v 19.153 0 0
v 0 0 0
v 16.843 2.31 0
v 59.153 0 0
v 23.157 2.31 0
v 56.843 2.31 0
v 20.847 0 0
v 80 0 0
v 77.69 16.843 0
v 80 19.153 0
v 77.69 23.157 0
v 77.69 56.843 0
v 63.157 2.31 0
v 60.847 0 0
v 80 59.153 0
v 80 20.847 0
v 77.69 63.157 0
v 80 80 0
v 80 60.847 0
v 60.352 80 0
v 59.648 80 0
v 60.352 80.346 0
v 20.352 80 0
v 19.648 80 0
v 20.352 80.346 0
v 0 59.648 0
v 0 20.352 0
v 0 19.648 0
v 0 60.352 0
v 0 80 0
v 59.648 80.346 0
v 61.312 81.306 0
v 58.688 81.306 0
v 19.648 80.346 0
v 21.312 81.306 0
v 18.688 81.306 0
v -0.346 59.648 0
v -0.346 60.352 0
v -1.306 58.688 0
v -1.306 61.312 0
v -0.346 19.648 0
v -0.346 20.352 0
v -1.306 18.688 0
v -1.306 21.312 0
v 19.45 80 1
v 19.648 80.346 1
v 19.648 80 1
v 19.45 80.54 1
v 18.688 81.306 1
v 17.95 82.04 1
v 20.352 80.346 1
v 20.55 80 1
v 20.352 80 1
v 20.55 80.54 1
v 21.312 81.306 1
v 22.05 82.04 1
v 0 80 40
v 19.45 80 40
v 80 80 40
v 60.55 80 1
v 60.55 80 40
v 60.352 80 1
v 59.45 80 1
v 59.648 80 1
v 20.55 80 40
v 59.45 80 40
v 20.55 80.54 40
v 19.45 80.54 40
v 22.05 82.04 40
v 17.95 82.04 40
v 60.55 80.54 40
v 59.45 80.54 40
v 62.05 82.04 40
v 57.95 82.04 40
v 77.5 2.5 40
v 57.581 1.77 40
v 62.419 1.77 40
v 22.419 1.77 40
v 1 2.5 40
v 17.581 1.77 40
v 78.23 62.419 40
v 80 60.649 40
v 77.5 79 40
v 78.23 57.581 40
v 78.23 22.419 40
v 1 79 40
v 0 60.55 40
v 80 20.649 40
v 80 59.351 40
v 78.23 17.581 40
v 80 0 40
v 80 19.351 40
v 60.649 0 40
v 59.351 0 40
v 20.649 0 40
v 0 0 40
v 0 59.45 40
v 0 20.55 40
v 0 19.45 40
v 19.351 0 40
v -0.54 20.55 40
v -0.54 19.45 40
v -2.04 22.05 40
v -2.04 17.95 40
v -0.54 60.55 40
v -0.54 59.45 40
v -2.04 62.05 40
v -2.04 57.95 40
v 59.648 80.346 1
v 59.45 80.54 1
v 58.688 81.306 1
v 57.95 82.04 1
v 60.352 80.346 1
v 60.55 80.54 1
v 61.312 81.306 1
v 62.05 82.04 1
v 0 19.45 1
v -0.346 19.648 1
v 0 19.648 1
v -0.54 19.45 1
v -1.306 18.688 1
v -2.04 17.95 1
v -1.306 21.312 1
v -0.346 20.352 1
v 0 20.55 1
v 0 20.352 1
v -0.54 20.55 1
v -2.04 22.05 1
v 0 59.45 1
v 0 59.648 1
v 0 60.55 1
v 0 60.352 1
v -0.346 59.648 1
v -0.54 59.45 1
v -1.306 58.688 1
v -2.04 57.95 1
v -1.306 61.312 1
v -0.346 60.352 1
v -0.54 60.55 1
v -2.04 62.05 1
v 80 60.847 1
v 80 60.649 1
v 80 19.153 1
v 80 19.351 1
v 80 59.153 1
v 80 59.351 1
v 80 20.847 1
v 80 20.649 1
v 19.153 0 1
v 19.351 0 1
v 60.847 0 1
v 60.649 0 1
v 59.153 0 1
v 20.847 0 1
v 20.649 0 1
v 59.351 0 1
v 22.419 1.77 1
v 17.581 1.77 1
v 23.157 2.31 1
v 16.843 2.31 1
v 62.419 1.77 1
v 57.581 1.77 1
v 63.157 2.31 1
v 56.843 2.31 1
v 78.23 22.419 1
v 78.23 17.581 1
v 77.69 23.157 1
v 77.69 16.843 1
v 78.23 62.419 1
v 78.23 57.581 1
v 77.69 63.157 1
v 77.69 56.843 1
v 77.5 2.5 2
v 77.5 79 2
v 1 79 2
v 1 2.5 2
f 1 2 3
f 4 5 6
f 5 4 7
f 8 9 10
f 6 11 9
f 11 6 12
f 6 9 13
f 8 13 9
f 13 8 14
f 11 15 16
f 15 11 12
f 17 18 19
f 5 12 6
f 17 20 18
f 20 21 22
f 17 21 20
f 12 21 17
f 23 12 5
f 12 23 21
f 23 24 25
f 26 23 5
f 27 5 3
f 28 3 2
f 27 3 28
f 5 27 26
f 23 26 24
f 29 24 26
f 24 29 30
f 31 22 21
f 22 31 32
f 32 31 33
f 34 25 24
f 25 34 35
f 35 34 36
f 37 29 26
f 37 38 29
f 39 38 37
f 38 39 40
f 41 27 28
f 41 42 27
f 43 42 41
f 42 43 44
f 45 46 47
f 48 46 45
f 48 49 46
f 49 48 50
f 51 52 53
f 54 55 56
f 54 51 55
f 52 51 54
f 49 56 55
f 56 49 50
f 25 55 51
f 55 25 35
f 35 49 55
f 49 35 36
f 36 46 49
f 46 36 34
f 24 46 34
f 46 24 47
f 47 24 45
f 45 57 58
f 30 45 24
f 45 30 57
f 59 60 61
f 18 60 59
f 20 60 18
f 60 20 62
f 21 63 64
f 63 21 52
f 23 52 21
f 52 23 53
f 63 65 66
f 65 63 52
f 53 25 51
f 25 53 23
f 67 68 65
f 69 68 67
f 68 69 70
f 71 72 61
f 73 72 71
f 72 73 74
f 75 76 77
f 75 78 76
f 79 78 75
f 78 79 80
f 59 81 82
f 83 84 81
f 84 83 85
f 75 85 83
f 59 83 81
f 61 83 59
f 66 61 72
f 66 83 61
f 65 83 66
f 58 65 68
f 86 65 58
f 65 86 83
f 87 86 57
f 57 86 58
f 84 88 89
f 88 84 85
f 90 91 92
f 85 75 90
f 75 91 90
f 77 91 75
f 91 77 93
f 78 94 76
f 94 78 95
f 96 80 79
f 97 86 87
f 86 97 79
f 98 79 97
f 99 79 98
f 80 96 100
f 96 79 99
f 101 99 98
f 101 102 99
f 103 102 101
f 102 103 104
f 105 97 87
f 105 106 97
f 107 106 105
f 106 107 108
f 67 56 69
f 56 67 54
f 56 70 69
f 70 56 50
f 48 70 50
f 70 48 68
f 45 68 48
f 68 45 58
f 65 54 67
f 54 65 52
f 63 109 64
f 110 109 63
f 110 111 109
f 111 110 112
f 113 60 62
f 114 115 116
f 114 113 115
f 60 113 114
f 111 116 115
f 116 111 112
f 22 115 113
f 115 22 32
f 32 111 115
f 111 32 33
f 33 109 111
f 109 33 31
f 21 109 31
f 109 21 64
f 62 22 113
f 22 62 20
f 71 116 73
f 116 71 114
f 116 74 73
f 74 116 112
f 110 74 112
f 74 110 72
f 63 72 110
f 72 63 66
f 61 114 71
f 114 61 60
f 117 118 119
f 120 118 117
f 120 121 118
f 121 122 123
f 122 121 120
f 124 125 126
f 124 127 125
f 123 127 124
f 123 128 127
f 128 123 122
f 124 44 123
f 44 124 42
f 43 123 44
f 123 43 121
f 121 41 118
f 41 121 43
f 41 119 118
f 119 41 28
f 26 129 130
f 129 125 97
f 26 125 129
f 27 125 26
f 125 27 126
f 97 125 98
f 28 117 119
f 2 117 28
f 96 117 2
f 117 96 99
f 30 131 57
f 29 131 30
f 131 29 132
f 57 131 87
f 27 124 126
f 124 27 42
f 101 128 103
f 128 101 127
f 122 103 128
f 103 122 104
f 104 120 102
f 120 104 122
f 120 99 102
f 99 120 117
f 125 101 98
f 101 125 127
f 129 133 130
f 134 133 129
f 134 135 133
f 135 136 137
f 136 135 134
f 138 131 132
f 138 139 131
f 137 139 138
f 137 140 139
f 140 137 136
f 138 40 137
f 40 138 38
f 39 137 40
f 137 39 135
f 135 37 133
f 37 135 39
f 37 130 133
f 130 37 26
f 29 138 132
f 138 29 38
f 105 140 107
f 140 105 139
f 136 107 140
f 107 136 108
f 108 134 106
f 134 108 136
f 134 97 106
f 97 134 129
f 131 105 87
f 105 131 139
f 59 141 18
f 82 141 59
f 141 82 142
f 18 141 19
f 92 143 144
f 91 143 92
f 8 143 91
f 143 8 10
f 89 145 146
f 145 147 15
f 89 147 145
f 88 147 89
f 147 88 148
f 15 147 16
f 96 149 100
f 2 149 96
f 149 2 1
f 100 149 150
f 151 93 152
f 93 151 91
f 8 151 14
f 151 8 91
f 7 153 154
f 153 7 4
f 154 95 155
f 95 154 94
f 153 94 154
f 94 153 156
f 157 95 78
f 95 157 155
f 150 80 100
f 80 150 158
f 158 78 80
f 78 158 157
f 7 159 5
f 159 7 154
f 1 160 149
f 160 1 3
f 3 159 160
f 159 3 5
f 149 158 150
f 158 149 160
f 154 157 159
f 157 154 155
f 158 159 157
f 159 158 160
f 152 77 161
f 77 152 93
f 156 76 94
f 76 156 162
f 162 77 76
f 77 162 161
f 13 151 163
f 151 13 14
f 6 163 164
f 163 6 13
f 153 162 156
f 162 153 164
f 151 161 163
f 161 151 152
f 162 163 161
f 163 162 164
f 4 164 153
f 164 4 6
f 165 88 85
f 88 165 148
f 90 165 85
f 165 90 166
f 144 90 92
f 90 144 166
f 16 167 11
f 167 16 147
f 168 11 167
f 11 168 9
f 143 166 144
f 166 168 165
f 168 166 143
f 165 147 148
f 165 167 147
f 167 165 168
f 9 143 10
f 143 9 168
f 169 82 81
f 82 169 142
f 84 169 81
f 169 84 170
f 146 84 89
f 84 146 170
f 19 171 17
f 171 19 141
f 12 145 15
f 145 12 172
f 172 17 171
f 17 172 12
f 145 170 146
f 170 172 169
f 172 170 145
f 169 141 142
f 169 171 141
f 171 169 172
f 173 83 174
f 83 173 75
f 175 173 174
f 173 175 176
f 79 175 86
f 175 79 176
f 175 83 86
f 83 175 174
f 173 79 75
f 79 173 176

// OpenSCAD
//this section defines a module for creating a "rounded" bottom to the box, useful when storing small parts
module RoundBottom(width, length, height){    
    translate([0,length,0])rotate([90,0,0])
    linear_extrude(length, center=false)
    
    difference() {
        translate([-width/2,0,0])square([width,height/2],center=false);
        translate([0,height/2,0])resize([width,height]) circle(d=width*10);
    }
}


module interlockingbox(
    //Box Width in units
    BoxWidthUnits = 3,
    //Box Length in units
    BoxLengthUnits = 3,
    //Box Height in mm
    BoxHeight = 120
)
{
echo(version=version(2.0));
//comments: Version 2 adds anti-"elephant foot" scaling at bottom of dovetail sections
/* [Size] */
//Box unit size in mm. This defines the size of 1 'unit' for your box.
BoxUnits = 40;
BoxWidth = BoxWidthUnits * BoxUnits;
BoxLength = BoxLengthUnits * BoxUnits;
//Box Wall Thickness in mm
BoxWall = 1;
//Box Floor Thickness in mm
BoxFloor = 2;
//Fit Factor. Greater factor = looser fit
FitFactor = 0.18;  // [0:0.05:0.4]
//RoundedBottom = "EW"; // [EW:East-West, NS:North-South]
RoundedBottom = ""; // [EW:East-West, NS:North-South]

/* [Walls] */
//North Wall open or closed
NorthWallOpen = 0; // [0:Closed, 1:Open]
//South Wall open or closed
SouthWallOpen = 0; // [0:Closed, 1:Open]

/* [Dovetail] */
//Dovetail inside length in mm
DTInsideLength = 1.1;
//Dovetail angle in degrees
DTAngle = 45;
//Dovetail width in mm
DTWidth = 1.5;

/* [Hidden] */
//This helps calculate the length of the 'long' side of the dovetail
DTx=tan(DTAngle)*DTWidth;
//This polygon defines the dovetail shape
DTShape = [[0,0],[DTInsideLength/2,0],[DTInsideLength/2+DTx,DTWidth],[-DTInsideLength/2-DTx,DTWidth],[-DTInsideLength/2,0]];



union(){
    //creates and transforms rounded bottom
    if (RoundedBottom=="EW") {
    translate([0,(BoxWidth/2)+BoxWall,BoxFloor])
    rotate([0,0,-90])
    RoundBottom(BoxWidth-DTWidth-(BoxWall),BoxLength-DTWidth-BoxWall,2*(BoxHeight-BoxFloor));
    }

    //creates rounded bottom oriented North-South
    if (RoundedBottom=="NS") {
    translate([(BoxLength/2)-BoxWall,DTWidth+BoxWall/2,BoxFloor])
    rotate([0,0,0])
    RoundBottom(BoxLength-DTWidth-(BoxWall),BoxWidth-DTWidth-BoxWall,2*(BoxHeight-BoxFloor));
    }

    //Creates main box,without round bottom
    difference(){
        
    union(){
        //main box
    cube([BoxLength,BoxWidth,BoxHeight], center=false);

        //male dovetails
    for (i=[1:BoxLengthUnits])
    translate([(i-1)*BoxUnits+(BoxUnits/2),BoxWidth,0])
        //in 2 sections. first section is slightly scaled down to counter "elephant foot"
        union(){
            linear_extrude(height=1, center=false)
                scale([1-(2*FitFactor),1-(2*FitFactor),1])
                union(){        
                    //this adds a slight offset to the male dovetail for a looser fit
                    translate([-DTInsideLength/2,0,0])
                    square([DTInsideLength,DTWidth]);
                    //main dovetail shape
                    translate([0,DTWidth*FitFactor*2,0])
                    polygon(DTShape);
                };
            translate([0,0,1])
            linear_extrude(height=BoxHeight-1, center=false)
                    union(){
                    //this adds a slight offset to the male dovetail for a looser fit
                    translate([-DTInsideLength/2,0,0])
                    square([DTInsideLength,DTWidth]);
                    //main dovetail shape
                    translate([0,DTWidth*FitFactor*2,0])
                    polygon(DTShape);
                    };
        }        

    for (i=[1:BoxWidthUnits])
    translate([0,(i-1)*BoxUnits+(BoxUnits/2),0])
        //in 2 sections. first section is slightly scaled down to counter "elephant foot"
        rotate([0,0,90])
        union(){
            linear_extrude(height=1, center=false)				//1mm high anti-elephant foot section
                scale([1-(2*FitFactor),1-(2*FitFactor),1])
                union(){        
                    //this adds a slight offset to the male dovetail for a looser fit
                    translate([-DTInsideLength/2,0,0])
                    square([DTInsideLength,DTWidth]);
                    //main dovetail shape
                    translate([0,DTWidth*FitFactor*2,0])
                    polygon(DTShape);
                };
            translate([0,0,1])
            linear_extrude(height=BoxHeight-1, center=false)
                union(){
                    //male dovetail offset
                    translate([-DTInsideLength/2,0,0])
                    square([DTInsideLength,DTWidth]);
                    //main dovetail shape
                    translate([0,DTWidth*FitFactor*2,0])
                    polygon(DTShape);
                };
        }
    }
    //female dovetails
    for (i=[1:BoxLengthUnits])
        union(){
            translate([(i-1)*BoxUnits+(BoxUnits/2),0,0])
                scale([1+FitFactor,1+FitFactor,1])
                linear_extrude(height=BoxHeight, center=false)
                polygon(DTShape);
        
            //added a second dovetail cutout at the bottom, scaled up to counter "elephant foot" when printed
            translate([(i-1)*BoxUnits+(BoxUnits/2),0,0])
                scale([1+(3*FitFactor),1+(3*FitFactor),1])
                linear_extrude(height=1, center=false)
                polygon(DTShape);					
        }

    for (i=[1:BoxWidthUnits])
        union(){
            translate([BoxLength,(i-1)*BoxUnits+(BoxUnits/2),0])
                rotate([0,0,90])
                    scale([1+FitFactor,1+FitFactor,1])
                        linear_extrude(height=BoxHeight, center=false)
                            polygon(DTShape);
            //added a second dovetail cutout at the bottom, scaled up to counter "elephant foot" when printed
            translate([BoxLength,(i-1)*BoxUnits+(BoxUnits/2),0])
                rotate([0,0,90])
                    scale([1+(3*FitFactor),1+(3*FitFactor),1])
                        linear_extrude(height=1, center=false)
                            polygon(DTShape);	
        }
    //carves out main box
    translate([BoxWall,DTWidth+BoxWall,BoxFloor])
        cube([BoxLength-(2*BoxWall)-DTWidth, (BoxWidth-(2*BoxWall)-DTWidth), BoxHeight]);

    if (NorthWallOpen)
        translate([-DTWidth*(1+FitFactor+FitFactor),BoxWall+DTWidth,BoxFloor], center=false)
            cube([BoxWall+(DTWidth*(1+FitFactor+FitFactor)), (BoxWidth-(2*BoxWall)-DTWidth), BoxHeight]);    

    if (SouthWallOpen)
        translate([BoxLength-(BoxWall)-DTWidth,BoxWall+DTWidth,BoxFloor], center=false)
            cube([BoxWall+DTWidth, (BoxWidth-(2*BoxWall)-DTWidth), BoxHeight]);

    }
  }
}


interlockingbox(2,2,40);
